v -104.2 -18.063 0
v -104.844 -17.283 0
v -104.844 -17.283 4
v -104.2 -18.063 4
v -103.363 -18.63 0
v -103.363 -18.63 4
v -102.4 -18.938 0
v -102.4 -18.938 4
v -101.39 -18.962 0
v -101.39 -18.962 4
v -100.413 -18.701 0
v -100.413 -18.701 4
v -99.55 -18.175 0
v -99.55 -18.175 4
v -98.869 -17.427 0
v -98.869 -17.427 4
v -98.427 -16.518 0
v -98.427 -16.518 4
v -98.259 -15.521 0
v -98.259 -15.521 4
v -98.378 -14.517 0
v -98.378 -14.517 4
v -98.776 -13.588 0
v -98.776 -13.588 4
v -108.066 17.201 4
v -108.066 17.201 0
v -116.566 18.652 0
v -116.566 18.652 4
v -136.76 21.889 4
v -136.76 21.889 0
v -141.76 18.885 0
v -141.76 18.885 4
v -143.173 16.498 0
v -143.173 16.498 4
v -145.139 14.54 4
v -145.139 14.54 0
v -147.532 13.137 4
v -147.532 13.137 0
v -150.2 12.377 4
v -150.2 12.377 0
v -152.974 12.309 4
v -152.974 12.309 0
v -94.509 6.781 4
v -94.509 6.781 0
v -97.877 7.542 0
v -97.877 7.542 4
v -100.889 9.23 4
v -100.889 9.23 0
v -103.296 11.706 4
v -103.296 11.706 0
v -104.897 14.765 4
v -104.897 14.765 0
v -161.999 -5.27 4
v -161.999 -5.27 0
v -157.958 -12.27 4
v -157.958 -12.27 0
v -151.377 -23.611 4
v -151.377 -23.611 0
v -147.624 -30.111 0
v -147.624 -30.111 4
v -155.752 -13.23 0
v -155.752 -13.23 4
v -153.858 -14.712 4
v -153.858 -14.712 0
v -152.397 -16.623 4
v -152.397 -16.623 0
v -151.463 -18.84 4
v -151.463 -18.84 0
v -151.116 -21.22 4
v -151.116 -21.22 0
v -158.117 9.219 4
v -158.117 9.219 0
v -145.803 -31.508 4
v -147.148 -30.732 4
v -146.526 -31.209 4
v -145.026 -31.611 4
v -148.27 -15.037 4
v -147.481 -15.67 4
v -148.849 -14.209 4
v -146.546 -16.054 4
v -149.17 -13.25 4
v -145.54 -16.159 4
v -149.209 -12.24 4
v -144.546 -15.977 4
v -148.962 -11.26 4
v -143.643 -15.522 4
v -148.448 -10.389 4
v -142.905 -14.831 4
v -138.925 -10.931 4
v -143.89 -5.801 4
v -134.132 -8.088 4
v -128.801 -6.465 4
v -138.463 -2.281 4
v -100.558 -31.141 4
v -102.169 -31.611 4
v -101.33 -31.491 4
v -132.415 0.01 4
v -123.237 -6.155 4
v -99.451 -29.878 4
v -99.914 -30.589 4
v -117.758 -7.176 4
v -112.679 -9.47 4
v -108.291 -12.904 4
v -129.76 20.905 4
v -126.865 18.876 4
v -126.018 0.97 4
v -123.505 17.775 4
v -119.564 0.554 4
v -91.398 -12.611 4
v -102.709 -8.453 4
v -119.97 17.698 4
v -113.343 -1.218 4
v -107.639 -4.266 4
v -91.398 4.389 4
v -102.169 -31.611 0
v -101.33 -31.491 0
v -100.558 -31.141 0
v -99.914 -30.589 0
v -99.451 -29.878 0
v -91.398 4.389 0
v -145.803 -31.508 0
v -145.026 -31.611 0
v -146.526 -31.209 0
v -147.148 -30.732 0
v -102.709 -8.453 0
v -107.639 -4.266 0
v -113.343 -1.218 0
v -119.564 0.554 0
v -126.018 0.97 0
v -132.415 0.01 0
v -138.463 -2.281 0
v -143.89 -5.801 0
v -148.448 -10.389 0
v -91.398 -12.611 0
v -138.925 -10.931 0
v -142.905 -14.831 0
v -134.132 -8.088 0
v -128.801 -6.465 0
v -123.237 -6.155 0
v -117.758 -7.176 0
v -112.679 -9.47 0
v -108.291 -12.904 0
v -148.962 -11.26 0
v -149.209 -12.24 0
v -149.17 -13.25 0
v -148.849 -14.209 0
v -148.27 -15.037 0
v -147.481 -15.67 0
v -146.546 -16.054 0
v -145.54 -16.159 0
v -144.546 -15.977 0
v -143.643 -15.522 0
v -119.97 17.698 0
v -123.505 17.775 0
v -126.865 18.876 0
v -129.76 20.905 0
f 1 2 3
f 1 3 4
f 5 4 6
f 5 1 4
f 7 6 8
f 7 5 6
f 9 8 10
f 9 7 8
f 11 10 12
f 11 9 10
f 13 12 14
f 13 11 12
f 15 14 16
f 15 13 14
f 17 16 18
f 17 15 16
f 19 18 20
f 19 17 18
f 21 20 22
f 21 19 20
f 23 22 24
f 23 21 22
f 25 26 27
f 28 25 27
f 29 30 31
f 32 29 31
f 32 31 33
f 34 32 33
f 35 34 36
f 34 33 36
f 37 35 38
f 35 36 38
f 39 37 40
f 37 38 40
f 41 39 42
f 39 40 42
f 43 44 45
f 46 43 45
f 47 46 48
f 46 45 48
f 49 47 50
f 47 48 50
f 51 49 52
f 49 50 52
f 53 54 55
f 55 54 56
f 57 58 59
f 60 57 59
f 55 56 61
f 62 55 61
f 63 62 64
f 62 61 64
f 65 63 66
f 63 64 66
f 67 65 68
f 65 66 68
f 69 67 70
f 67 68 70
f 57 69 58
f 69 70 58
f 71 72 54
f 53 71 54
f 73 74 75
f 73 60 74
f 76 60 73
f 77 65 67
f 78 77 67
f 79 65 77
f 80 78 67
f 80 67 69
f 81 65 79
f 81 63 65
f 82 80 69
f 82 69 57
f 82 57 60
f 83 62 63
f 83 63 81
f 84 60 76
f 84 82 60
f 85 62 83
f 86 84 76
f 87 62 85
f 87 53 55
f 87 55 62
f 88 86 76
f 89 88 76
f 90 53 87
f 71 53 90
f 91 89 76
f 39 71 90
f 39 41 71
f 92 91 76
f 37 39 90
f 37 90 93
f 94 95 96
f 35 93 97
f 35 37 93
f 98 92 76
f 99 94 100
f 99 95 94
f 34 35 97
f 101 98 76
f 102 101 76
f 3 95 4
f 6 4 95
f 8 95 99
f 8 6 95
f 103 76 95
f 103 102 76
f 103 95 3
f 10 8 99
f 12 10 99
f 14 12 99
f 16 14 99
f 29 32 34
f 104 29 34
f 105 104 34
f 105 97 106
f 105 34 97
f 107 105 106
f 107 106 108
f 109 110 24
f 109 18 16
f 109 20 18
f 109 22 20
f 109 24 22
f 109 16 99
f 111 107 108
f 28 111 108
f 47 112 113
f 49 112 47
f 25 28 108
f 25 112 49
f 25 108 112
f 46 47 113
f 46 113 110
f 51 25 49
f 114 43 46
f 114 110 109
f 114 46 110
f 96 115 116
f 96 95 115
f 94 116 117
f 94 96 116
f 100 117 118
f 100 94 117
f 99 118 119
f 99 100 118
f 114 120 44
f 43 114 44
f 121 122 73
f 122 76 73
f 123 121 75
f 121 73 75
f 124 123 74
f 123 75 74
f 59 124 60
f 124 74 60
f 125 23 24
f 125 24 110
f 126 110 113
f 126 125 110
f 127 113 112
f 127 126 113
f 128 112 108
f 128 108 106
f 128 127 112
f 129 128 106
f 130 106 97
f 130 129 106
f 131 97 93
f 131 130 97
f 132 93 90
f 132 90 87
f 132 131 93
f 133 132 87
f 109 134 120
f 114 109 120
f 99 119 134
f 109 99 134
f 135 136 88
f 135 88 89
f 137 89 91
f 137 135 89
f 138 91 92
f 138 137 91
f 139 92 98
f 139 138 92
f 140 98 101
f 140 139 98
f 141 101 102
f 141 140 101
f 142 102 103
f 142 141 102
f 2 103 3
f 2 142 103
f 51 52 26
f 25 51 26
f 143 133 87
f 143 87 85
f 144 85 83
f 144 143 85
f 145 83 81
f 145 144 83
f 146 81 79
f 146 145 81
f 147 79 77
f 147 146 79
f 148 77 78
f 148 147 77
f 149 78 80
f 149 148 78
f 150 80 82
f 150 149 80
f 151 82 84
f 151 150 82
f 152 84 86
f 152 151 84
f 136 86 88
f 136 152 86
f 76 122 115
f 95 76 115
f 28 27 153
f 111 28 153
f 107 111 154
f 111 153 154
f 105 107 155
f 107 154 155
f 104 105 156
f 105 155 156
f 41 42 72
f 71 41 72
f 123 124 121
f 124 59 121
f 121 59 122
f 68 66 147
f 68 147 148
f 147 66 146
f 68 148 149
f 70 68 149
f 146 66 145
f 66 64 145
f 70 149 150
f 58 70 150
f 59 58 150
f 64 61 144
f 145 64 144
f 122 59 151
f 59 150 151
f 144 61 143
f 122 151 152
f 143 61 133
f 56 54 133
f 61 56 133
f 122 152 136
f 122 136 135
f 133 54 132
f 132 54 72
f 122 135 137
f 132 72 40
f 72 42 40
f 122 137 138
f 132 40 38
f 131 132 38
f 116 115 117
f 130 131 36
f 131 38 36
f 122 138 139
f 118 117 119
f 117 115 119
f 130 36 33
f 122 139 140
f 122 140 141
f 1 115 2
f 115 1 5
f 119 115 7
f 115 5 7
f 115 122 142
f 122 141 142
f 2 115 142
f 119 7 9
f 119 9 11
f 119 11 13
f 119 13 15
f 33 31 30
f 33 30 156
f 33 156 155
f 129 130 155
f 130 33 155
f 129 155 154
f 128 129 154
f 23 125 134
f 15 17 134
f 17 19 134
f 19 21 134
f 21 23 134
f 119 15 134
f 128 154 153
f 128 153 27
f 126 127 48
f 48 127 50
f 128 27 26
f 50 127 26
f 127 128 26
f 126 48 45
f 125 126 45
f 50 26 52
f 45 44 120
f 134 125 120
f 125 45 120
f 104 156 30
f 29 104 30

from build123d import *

# Parameters (mm, degrees)
BOSS_EXTRUDE1_DEPTH = 4
FILLET1_R           = 3


with BuildPart() as part:
    # Sketch1 → Boss-Extrude1 (new body)
    with BuildSketch(Plane.XY):
        with BuildLine():
            Line((-146.758239428, -31.610515221), (-100.258239428, -31.610515221))
            Line((-100.258239428, -31.610515221), (-91.398393923, -12.610515221))
            Line((-91.398393923, -12.610515221), (-91.398393923, 4.389484779))
            Line((-91.398393923, 4.389484779), (-94.509492228, 6.780828765))
            ThreePointArc((-94.509492228, 6.780828765), (-100.889202751, 9.230316509), (-104.897213893, 14.765345257))
            Line((-104.897213893, 14.765345257), (-108.065854757, 17.200919299))
            Line((-108.065854757, 17.200919299), (-116.565854757, 18.652315204))
            ThreePointArc((-116.565854757, 18.652315204), (-123.504827753, 17.774994873), (-129.759511963, 20.90516462))
            Line((-129.759511963, 20.90516462), (-136.759511963, 21.888950463))
            Line((-136.759511963, 21.888950463), (-141.759511963, 18.884647367))
            ThreePointArc((-141.759511963, 18.884647367), (-146.29133737, 13.762936165), (-152.973799535, 12.308953164))
            Line((-152.973799535, 12.308953164), (-158.116803339, 9.218724715))
            Line((-158.116803339, 9.218724715), (-161.999089016, -5.27016268))
            Line((-161.999089016, -5.27016268), (-157.957637132, -12.27016268))
            ThreePointArc((-157.957637132, -12.27016268), (-152.397461521, -16.623171082), (-151.377041582, -23.610515221))
            Line((-151.377041582, -23.610515221), (-146.758239428, -31.610515221))
        make_face()
        with BuildLine():
            ThreePointArc((-98.776012151, -13.587867208), (-122.779946794, 0.93416519), (-148.448407118, -10.388751744))
            ThreePointArc((-148.448407118, -10.388751744), (-147.89790448, -15.381816967), (-142.904839257, -14.83131433))
            ThreePointArc((-142.904839257, -14.83131433), (-123.236532063, -6.155195631), (-104.843657911, -17.282617793))
            ThreePointArc((-104.843657911, -17.282617793), (-99.962459738, -18.46906538), (-98.776012151, -13.587867208))
        make_face(mode=Mode.SUBTRACT)
    extrude(amount=BOSS_EXTRUDE1_DEPTH)

    # Fillet1
    fillet1_edges = [part.edges().sort_by_distance(p)[0] for p in [
        (-146.758239428, -31.610515221, 2),
        (-100.258239428, -31.610515221, 2),
    ]]
    fillet(fillet1_edges, radius=FILLET1_R)


solid = part.part
